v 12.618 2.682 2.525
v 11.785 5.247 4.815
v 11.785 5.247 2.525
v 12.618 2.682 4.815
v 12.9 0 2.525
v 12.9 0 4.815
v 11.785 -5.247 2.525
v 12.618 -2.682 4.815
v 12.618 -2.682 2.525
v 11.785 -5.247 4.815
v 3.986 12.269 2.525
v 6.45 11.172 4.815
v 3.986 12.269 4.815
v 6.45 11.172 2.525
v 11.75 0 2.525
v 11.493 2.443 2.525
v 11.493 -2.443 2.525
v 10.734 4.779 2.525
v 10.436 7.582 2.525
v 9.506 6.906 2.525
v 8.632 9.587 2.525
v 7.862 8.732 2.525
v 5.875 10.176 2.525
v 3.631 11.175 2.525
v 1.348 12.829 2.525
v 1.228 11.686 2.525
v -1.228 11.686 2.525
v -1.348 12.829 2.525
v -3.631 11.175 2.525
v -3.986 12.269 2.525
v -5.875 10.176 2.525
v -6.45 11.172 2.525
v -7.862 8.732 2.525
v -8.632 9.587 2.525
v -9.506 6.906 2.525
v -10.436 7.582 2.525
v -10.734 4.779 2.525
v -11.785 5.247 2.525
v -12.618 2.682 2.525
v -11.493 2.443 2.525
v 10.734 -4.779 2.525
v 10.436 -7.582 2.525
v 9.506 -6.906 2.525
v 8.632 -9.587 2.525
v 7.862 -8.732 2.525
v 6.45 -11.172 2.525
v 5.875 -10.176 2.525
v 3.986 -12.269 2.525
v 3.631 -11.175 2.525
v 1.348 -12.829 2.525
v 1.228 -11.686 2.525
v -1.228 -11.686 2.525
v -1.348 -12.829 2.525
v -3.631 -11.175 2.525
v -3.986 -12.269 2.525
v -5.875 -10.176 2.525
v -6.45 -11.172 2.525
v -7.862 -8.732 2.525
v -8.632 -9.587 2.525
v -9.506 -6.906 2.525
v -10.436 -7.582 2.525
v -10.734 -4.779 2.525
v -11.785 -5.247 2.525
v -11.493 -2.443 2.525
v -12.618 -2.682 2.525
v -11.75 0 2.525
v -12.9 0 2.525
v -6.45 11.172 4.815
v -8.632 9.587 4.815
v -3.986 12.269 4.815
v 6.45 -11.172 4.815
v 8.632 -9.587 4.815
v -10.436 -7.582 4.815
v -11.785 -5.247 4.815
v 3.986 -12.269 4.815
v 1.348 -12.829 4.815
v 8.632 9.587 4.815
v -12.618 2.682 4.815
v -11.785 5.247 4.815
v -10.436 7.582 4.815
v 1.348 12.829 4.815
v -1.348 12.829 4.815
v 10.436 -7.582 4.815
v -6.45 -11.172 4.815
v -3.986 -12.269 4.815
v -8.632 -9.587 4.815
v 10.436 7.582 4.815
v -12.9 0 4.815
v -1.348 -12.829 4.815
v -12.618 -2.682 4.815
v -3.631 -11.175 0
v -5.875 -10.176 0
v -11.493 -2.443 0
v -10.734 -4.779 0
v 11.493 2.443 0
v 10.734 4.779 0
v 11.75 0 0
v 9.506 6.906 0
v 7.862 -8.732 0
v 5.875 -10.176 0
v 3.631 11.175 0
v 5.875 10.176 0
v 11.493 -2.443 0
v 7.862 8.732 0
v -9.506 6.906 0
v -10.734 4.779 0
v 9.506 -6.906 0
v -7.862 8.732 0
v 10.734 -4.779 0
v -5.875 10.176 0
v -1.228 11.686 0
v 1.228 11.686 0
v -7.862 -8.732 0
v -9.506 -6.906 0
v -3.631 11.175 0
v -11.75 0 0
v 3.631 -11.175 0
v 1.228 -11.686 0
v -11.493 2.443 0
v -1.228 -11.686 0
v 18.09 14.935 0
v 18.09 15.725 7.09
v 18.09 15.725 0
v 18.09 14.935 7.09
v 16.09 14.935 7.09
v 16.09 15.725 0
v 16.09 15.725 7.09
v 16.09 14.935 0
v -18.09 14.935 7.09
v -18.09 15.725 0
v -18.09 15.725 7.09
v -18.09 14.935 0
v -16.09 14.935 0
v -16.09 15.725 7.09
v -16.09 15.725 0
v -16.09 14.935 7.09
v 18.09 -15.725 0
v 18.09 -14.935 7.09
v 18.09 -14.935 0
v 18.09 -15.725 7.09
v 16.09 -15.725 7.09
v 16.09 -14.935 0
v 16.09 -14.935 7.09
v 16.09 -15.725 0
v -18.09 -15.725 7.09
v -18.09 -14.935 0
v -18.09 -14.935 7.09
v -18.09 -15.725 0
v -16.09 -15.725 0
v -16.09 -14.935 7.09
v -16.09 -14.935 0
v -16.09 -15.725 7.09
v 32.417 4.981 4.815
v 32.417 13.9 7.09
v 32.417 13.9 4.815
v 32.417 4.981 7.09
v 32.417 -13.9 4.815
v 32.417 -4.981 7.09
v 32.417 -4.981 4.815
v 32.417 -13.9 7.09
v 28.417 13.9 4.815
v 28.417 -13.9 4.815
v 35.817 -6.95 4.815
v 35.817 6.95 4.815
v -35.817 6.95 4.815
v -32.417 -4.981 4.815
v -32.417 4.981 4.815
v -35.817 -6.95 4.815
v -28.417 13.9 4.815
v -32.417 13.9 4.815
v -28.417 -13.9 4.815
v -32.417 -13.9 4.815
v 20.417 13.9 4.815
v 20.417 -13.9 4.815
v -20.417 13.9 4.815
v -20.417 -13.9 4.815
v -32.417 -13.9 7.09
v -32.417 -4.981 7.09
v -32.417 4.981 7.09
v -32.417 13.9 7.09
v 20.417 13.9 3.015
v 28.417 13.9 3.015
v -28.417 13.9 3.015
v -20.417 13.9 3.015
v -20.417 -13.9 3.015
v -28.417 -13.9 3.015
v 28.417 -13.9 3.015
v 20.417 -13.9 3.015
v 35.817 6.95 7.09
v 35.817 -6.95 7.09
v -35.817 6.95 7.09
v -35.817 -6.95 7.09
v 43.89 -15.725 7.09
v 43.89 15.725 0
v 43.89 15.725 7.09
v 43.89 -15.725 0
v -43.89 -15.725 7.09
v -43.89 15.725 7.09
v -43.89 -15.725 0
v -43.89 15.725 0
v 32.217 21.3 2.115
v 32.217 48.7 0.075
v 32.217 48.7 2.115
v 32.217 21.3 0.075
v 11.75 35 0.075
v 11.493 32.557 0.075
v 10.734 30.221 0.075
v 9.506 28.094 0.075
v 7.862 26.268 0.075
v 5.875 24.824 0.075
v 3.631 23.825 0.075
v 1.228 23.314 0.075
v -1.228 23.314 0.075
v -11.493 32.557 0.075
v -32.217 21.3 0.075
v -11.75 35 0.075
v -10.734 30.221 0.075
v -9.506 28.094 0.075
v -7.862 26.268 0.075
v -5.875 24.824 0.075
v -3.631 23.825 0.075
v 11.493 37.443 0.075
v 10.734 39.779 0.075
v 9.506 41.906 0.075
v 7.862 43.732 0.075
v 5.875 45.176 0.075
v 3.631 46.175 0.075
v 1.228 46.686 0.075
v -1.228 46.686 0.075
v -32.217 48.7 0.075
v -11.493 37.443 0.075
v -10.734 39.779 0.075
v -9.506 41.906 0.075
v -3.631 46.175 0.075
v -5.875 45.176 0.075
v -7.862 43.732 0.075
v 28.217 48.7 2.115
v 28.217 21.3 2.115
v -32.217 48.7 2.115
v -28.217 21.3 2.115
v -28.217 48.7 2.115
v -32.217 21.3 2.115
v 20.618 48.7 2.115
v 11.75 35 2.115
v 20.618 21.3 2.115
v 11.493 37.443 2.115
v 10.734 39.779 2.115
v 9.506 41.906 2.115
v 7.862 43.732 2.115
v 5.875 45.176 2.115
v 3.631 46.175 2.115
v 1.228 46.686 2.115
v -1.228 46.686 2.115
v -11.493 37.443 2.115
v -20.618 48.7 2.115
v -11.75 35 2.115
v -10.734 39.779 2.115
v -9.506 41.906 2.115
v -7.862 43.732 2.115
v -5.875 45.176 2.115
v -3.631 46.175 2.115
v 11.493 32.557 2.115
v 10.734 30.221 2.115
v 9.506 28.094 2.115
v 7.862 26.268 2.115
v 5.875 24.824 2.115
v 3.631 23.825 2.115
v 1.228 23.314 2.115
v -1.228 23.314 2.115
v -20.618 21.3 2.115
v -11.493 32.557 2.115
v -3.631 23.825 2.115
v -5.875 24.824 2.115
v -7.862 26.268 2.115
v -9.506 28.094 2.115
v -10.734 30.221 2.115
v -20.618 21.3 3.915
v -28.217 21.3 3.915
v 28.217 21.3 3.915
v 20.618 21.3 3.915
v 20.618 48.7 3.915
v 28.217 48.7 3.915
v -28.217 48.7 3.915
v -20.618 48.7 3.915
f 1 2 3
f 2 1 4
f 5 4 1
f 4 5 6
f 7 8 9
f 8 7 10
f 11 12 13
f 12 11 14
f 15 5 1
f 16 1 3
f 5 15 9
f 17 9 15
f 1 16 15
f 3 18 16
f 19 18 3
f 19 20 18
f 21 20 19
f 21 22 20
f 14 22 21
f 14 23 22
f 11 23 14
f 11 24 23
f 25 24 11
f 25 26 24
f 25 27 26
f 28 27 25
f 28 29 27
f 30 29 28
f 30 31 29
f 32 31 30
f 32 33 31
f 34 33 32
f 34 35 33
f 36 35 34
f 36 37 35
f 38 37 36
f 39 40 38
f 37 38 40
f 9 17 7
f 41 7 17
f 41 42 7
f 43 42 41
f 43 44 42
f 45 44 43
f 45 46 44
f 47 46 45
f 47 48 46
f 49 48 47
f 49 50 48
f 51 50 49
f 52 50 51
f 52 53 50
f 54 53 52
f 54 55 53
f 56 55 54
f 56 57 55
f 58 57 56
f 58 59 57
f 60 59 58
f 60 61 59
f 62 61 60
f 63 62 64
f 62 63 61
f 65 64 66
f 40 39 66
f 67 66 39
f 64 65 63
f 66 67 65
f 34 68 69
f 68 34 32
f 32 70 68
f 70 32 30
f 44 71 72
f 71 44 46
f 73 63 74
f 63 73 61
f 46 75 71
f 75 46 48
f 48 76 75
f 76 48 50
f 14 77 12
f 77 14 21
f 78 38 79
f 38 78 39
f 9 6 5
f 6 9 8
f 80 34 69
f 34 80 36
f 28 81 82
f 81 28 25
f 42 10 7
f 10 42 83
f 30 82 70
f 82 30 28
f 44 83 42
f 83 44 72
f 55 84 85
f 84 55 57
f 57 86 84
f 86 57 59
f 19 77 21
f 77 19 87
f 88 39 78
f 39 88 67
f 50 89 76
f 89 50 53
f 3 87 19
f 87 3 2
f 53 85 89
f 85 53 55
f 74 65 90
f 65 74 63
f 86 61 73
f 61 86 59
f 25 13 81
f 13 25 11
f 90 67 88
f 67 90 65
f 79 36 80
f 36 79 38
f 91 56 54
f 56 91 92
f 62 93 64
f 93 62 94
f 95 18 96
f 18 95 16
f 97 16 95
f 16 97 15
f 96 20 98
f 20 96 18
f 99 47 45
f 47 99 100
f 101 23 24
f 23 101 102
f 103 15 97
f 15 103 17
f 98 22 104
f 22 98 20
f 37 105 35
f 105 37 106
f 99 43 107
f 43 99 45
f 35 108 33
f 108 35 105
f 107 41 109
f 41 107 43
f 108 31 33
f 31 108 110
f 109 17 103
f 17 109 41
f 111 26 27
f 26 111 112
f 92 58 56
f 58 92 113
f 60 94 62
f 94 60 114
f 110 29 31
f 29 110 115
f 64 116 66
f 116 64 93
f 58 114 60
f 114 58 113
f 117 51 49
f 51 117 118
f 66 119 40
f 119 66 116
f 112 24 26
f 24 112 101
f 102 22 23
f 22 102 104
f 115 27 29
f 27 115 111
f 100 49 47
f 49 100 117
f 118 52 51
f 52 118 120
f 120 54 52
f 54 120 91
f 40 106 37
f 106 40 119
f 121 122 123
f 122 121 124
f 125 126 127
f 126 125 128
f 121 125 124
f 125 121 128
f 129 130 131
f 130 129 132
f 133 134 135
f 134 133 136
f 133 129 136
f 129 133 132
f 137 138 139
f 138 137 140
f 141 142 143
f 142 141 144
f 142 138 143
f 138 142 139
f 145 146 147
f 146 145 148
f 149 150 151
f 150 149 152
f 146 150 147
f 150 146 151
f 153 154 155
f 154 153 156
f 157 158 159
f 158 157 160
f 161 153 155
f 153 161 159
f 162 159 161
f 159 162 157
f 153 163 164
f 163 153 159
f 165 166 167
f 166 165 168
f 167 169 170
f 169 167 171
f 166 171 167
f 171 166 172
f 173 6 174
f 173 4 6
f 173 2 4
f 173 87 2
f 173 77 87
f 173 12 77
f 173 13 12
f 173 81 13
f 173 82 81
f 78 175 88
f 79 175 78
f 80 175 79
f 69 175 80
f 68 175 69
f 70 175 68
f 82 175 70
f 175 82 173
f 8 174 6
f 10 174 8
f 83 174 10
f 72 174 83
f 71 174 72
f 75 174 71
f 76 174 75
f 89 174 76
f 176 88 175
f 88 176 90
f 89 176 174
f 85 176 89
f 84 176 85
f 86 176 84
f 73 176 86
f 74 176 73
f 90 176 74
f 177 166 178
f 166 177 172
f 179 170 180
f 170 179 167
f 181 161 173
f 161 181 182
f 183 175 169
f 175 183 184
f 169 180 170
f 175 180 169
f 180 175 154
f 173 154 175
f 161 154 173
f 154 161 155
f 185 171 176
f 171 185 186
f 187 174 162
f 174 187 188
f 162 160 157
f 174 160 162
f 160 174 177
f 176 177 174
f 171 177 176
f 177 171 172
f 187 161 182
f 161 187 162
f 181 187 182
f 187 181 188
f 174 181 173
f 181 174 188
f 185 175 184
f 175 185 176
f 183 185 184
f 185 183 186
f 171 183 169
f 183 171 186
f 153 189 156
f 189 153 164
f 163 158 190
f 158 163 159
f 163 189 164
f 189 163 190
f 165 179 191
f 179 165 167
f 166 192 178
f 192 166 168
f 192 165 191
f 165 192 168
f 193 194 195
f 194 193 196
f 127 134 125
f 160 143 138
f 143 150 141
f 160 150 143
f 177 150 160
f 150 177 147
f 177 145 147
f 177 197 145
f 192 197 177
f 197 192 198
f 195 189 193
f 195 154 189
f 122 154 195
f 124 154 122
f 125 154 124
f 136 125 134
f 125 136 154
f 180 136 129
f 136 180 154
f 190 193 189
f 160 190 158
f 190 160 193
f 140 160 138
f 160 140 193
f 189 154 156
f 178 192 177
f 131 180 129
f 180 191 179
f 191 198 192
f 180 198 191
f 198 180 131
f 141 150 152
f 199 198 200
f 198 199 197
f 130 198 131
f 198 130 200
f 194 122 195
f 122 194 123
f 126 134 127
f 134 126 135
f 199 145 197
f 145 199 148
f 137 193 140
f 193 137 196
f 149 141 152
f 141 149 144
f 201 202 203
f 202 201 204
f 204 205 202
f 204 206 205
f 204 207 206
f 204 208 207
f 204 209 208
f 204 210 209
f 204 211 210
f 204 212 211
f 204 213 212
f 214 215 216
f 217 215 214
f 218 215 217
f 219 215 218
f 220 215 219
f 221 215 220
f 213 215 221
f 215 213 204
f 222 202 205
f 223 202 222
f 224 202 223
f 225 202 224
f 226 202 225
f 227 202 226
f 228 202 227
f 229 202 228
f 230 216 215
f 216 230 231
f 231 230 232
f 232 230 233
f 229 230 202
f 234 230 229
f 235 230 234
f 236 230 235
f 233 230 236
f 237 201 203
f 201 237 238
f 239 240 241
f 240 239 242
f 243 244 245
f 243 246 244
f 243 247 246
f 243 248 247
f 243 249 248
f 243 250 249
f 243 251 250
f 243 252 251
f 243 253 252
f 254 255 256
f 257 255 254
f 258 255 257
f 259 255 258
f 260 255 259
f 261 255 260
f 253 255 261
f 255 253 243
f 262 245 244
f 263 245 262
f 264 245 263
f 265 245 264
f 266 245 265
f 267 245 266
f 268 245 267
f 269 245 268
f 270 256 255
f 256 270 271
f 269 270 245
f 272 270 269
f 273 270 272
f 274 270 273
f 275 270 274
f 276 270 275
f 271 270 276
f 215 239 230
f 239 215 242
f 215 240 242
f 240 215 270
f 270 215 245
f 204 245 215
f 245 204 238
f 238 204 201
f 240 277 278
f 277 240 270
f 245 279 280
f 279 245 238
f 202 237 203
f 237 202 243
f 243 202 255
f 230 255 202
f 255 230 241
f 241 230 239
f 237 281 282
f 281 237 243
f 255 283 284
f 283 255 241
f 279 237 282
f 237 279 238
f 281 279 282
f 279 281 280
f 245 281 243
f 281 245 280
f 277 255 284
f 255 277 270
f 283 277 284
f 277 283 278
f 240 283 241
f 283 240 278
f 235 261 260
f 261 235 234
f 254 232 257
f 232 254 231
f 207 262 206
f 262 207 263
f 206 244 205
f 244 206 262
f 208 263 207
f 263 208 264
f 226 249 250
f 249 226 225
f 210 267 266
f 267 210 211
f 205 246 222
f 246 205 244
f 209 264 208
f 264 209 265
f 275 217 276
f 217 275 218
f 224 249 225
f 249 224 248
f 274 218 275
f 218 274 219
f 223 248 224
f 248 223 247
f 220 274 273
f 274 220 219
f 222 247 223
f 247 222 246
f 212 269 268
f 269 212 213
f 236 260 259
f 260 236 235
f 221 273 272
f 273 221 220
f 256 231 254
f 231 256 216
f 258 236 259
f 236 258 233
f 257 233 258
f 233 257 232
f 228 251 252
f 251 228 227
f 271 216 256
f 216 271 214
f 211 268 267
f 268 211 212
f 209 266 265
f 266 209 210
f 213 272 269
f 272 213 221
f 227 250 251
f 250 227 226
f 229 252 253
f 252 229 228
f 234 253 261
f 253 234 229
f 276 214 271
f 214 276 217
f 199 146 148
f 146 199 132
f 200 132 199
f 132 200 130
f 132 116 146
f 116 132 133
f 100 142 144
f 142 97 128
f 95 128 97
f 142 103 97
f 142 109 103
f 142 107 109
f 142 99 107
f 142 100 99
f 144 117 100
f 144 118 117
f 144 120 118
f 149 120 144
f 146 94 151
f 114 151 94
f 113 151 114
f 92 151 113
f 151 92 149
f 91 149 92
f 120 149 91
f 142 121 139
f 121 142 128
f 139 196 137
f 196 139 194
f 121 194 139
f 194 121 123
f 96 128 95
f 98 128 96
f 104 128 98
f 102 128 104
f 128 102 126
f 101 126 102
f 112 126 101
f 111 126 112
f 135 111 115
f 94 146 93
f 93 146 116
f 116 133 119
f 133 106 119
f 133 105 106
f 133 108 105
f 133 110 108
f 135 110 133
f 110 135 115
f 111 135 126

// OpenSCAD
//Olympus Scope Filter Slider
// Created by Juan Angueyra (angueyra@uw.edu)
// March 2016

// Variables
//Slider itself
sx=87.78;
sy=31.85-.4; //original = 31.85
sz=7.44; //original = 7.44
//notch
nx=2;//original = 1.7
ny=0.8;//original = 0.5.
ndelta=25.8+nx/2;
//Filter hole
fhr=28.80/2; //hole on fake holder is 28.80
hr=25.8/2; 
fr=23.5/2; //real filters are 25.4 mm * 1.58 mm (Edmund optics, 1 inch?)
fz=2; 
ffloorz=2;


 // main call
3Dprintflag=1;
osfs_tr = 3Dprintflag ? [0,0,sz/2-0.25/2-0.1] : [0,0,0];
osfs_rot = 3Dprintflag ? [0,0,0] : [0,0,0];

cout_tr = 3Dprintflag ? [0,35,sz/2-.085] : [0,0,0];
cout_rot = 3Dprintflag ? [180,0,0] : [0,0,0];

difference(){
union(){
	color([255/255,255/255,255/255],1){translate(osfs_tr){rotate(osfs_rot){osfs();}}}
	translate(cout_tr){rotate(cout_rot){color([200/255,0/255,0/255],1){cutout2(0.4);}}}
//	translate(osfs_tr){rotate(osfs_rot){filter();}}
}

translate([0,0,-1]) {cube(size=[100,100,2],center=true);}
}
// modules
module osfs() {
	difference() {
		cube(size=[sx,sy,sz-.25],center=true);
		holeNnotch();
		cutout(0);
	}
}

module holeNnotch() {
	union() {
		// outer hole (creates lip, is as big as real filter)
		translate([0,0,ffloorz+.75]) {cylinder(r=hr,h=sz,center=true);}
		//center hole (exposed filter)
		translate([0,0,0]) {cylinder(r=fr,h=sz*2,center=true);}
		// outer notches
		notch();
		mirror([1,0,0]) {notch();}
		mirror([0,1,0]) {notch();}
		mirror([0,1,0]) {mirror([1,0,0]) {notch();}}
		//translate([sx/2-ndelta,-(sy/2-ny/2+.01),0]){cube(size=[nx,ny,sz*2],center=true);}
	}
}

module notch() {
	translate([sx/2-ndelta,(sy/2-ny/2+.01),0]) {cube(size=[nx,ny,sz*2],center=true);} 
}

module cutout(ctol) {
	coutx=sx*3/4-1;
	couty=fhr*2-1;
	coutz=sz-fz-ffloorz-1;
	pegx=8;
	pegz=2;
	
	//trapz_peg
	tpb=couty/2;
	tpt=tpb/2;
	tph=6;
	tpz=coutz;
	
	translate([coutx/2+.4,0,ctol+.1]) {trapezoid(tpb-ctol,tpt-ctol,tph-ctol/2,tpz-ctol);}
	mirror([1,0,0]) {translate([coutx/2+.4,0,ctol+.1]) {trapezoid(tpb-ctol,tpt-ctol,tph-ctol/2,tpz-ctol);}}
	difference() {
		union(){
				translate([0,0,coutz+.1]) {cube(size=[coutx-ctol,couty-ctol,coutz-ctol],center=true);}
				translate([coutx/2-pegx,0,coutz+.3-pegz]) {cube(size=[pegx-ctol,couty-ctol,coutz-ctol],center=true);}
				translate([-(coutx/2-pegx),0,coutz+.3-pegz]) {cube(size=[pegx-ctol,couty-ctol,coutz-ctol],center=true);}
			}
			translate([0,0,0]) {cylinder(r=fr,h=sz*2,center=true);}
			filter();
	}
}

module cutout2(ctol) {
	coutx=sx*3/4-1;
	couty=fhr*2-1;
	coutz=sz-fz-ffloorz-1;
	pegx=8;
	pegz=2;
	
	//trapz_peg
	tpb=couty/2;
	tpt=tpb/2;
	tph=6;
	tpz=coutz;
	
//	translate([coutx/2+.4,0,ctol+.1]){trapezoid(tpb-ctol,tpt-ctol,tph-ctol/2,tpz-ctol);}
//	mirror([1,0,0]){translate([coutx/2+.4,0,ctol+.1]){trapezoid(tpb-ctol,tpt-ctol,tph-ctol/2,tpz-ctol);}}
	difference() {
		union(){
				translate([0,0,coutz+.1]) {cube(size=[coutx-ctol,couty-ctol,coutz-ctol],center=true);}
				translate([coutx/2-pegx,0,coutz+.3-pegz]) {cube(size=[pegx-ctol,couty-ctol,coutz-ctol],center=true);}
				translate([-(coutx/2-pegx),0,coutz+.3-pegz]) {cube(size=[pegx-ctol,couty-ctol,coutz-ctol],center=true);}
			}
			translate([0,0,0]) {cylinder(r=fr,h=sz*2,center=true);}
			filter();
	}
}

module filter() {
	color([0/255,0/255,0/255],1){
		translate([0,0,-sz/2+fz/2+ffloorz+1]) {cylinder(r=25.4/2,h=fz,center=true);}}
}

module trapezoid(width_base, width_top,height,thickness) {
	translate([height/2,-width_base/2,thickness/2]) {rotate([0,0,90]) {
  		linear_extrude(height = thickness) polygon(points=[[0,0],[width_base,0],[width_base-(width_base-width_top)/2,height],[(width_base-width_top)/2,height]], paths=[[0,1,2,3]]);  
	}}
}
